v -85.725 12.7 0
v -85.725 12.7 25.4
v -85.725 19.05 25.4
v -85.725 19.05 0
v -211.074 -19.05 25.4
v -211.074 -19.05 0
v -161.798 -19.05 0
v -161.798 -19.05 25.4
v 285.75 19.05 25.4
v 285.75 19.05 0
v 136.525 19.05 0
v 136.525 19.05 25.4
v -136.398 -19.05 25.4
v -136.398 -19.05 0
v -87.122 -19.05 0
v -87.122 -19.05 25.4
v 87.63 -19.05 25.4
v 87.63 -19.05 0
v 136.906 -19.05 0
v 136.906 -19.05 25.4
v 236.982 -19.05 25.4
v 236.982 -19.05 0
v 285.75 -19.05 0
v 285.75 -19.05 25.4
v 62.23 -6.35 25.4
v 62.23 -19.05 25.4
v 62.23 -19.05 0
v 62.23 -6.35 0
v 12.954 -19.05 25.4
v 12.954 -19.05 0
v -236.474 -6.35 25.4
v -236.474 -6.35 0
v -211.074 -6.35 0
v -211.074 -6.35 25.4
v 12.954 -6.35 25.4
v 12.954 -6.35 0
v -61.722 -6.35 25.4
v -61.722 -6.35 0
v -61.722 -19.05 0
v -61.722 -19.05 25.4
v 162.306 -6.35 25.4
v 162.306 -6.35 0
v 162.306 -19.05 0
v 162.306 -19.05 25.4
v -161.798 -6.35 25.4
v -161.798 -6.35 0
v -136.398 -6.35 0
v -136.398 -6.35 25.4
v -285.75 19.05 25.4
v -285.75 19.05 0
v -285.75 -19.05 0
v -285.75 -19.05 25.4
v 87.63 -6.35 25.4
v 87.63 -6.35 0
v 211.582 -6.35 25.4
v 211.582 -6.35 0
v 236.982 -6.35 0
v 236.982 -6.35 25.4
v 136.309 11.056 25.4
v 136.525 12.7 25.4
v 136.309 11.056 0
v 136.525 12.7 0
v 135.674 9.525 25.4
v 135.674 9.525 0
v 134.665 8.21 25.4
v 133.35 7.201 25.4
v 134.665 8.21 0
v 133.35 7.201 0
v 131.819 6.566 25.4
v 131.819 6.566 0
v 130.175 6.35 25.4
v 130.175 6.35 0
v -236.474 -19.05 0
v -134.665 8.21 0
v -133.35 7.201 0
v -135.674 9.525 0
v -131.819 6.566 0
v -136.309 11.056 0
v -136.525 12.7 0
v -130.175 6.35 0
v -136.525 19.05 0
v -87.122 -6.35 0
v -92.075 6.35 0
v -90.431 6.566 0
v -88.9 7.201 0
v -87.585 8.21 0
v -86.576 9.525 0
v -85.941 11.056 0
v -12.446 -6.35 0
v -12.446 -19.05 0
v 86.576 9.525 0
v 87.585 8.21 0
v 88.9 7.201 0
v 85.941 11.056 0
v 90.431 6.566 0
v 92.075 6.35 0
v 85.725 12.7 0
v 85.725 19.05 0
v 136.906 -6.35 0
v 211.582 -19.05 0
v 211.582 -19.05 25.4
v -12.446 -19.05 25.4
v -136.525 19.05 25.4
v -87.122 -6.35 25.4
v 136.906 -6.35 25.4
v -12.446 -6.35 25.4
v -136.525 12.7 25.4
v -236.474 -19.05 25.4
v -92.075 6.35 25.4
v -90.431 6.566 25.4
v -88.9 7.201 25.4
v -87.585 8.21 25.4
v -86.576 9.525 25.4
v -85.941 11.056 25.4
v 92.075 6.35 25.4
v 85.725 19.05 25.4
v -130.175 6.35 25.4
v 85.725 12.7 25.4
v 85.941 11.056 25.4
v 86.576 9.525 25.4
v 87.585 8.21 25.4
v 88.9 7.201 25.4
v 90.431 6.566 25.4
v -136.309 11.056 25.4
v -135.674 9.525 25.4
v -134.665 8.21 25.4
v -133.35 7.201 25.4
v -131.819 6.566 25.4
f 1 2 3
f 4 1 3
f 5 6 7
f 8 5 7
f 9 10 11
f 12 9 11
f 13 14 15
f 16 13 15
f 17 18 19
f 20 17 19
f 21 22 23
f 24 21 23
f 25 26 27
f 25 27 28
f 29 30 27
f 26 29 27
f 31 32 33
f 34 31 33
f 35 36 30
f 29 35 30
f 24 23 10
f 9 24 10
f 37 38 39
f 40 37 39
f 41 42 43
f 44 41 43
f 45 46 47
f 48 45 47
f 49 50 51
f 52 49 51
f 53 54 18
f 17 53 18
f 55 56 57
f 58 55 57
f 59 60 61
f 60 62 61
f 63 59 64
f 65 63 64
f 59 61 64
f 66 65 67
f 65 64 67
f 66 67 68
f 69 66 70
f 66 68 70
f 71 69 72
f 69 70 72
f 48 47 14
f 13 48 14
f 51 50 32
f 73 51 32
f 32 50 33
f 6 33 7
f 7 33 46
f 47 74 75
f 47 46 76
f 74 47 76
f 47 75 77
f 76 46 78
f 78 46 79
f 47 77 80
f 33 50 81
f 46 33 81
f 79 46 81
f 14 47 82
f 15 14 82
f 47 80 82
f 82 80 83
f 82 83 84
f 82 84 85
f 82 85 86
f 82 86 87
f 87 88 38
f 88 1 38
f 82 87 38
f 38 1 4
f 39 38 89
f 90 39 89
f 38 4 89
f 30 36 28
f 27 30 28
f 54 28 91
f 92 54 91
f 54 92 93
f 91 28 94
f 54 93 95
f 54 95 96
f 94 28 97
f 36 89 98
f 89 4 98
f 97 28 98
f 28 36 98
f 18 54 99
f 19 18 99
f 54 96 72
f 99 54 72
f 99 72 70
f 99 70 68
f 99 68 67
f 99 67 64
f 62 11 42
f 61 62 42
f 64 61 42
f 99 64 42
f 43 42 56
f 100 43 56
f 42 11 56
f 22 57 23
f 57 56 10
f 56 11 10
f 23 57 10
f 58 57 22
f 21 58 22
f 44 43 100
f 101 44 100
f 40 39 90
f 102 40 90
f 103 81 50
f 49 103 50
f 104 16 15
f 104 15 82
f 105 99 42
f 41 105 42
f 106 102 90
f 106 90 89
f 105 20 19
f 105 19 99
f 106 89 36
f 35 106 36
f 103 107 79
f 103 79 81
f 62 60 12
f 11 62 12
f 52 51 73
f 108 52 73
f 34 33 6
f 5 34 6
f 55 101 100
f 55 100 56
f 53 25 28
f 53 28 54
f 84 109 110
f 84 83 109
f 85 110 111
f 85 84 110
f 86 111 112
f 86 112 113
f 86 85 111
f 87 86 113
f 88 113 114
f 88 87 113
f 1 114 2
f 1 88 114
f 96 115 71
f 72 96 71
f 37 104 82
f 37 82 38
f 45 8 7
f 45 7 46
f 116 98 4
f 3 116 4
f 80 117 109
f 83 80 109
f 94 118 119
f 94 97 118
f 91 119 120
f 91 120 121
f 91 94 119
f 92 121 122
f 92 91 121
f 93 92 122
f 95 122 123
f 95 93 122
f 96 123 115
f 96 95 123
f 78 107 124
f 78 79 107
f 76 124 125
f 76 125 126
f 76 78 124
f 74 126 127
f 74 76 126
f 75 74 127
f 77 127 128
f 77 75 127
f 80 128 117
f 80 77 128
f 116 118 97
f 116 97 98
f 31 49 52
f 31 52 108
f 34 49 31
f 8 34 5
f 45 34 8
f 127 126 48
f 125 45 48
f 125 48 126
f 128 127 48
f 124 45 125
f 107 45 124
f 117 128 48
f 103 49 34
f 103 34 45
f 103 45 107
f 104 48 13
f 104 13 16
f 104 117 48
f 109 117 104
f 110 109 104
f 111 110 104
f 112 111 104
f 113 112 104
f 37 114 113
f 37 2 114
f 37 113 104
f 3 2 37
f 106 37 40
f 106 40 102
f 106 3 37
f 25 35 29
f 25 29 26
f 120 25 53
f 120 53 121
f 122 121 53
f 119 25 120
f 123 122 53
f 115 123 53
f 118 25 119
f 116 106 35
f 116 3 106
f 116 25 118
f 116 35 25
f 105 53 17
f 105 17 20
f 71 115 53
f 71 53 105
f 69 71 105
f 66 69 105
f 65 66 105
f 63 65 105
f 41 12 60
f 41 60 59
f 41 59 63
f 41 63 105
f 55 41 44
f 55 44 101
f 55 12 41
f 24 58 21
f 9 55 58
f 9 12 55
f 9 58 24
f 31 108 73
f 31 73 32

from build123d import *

# Parameters (mm, degrees)
F1_DEPTH = 25.4
F2_W     = 50.8
F2_H     = 25.4
F3_DEPTH = 25.401
F4_R     = 6.35


with BuildPart() as f1:
    # F0 (on Top) → F1 (new body)
    with BuildSketch(Plane.XY):
        Polygon((285.75, 19.05), (-285.75, 19.05), (-285.75, -19.05), (-236.474, -19.05), (-236.474, -6.35), (-211.074, -6.35), (-211.074, -19.05), (-161.798, -19.05), (-161.798, -6.35), (-136.398, -6.35), (-136.398, -19.05), (-87.122, -19.05), (-87.122, -6.35), (-61.722, -6.35), (-61.722, -19.05), (-12.446, -19.05), (-12.446, -6.35), (12.954, -6.35), (12.954, -19.05), (62.23, -19.05), (62.23, -6.35), (87.63, -6.35), (87.63, -19.05), (136.906, -19.05), (136.906, -6.35), (162.306, -6.35), (162.306, -19.05), (211.582, -19.05), (211.582, -6.35), (236.982, -6.35), (236.982, -19.05), (285.75, -19.05), align=None)
    extrude(amount=F1_DEPTH)

    # F2 (on face) → F3 (cut, through all)
    with BuildSketch(Plane.XY.offset(25.4)):
        with Locations((-111.125, 19.05)):
            Rectangle(F2_W, F2_H)
        with Locations((111.125, 19.05)):
            Rectangle(F2_W, F2_H)
    extrude(amount=-F3_DEPTH, mode=Mode.SUBTRACT)

    # F4
    f4_edges = [f1.edges().sort_by_distance(p)[0] for p in [
        (-136.525, 6.35, 12.7),
        (-85.725, 6.35, 12.7),
        (136.525, 6.35, 12.7),
        (85.725, 6.35, 12.7),
    ]]
    fillet(f4_edges, radius=F4_R)


solid = f1.part
